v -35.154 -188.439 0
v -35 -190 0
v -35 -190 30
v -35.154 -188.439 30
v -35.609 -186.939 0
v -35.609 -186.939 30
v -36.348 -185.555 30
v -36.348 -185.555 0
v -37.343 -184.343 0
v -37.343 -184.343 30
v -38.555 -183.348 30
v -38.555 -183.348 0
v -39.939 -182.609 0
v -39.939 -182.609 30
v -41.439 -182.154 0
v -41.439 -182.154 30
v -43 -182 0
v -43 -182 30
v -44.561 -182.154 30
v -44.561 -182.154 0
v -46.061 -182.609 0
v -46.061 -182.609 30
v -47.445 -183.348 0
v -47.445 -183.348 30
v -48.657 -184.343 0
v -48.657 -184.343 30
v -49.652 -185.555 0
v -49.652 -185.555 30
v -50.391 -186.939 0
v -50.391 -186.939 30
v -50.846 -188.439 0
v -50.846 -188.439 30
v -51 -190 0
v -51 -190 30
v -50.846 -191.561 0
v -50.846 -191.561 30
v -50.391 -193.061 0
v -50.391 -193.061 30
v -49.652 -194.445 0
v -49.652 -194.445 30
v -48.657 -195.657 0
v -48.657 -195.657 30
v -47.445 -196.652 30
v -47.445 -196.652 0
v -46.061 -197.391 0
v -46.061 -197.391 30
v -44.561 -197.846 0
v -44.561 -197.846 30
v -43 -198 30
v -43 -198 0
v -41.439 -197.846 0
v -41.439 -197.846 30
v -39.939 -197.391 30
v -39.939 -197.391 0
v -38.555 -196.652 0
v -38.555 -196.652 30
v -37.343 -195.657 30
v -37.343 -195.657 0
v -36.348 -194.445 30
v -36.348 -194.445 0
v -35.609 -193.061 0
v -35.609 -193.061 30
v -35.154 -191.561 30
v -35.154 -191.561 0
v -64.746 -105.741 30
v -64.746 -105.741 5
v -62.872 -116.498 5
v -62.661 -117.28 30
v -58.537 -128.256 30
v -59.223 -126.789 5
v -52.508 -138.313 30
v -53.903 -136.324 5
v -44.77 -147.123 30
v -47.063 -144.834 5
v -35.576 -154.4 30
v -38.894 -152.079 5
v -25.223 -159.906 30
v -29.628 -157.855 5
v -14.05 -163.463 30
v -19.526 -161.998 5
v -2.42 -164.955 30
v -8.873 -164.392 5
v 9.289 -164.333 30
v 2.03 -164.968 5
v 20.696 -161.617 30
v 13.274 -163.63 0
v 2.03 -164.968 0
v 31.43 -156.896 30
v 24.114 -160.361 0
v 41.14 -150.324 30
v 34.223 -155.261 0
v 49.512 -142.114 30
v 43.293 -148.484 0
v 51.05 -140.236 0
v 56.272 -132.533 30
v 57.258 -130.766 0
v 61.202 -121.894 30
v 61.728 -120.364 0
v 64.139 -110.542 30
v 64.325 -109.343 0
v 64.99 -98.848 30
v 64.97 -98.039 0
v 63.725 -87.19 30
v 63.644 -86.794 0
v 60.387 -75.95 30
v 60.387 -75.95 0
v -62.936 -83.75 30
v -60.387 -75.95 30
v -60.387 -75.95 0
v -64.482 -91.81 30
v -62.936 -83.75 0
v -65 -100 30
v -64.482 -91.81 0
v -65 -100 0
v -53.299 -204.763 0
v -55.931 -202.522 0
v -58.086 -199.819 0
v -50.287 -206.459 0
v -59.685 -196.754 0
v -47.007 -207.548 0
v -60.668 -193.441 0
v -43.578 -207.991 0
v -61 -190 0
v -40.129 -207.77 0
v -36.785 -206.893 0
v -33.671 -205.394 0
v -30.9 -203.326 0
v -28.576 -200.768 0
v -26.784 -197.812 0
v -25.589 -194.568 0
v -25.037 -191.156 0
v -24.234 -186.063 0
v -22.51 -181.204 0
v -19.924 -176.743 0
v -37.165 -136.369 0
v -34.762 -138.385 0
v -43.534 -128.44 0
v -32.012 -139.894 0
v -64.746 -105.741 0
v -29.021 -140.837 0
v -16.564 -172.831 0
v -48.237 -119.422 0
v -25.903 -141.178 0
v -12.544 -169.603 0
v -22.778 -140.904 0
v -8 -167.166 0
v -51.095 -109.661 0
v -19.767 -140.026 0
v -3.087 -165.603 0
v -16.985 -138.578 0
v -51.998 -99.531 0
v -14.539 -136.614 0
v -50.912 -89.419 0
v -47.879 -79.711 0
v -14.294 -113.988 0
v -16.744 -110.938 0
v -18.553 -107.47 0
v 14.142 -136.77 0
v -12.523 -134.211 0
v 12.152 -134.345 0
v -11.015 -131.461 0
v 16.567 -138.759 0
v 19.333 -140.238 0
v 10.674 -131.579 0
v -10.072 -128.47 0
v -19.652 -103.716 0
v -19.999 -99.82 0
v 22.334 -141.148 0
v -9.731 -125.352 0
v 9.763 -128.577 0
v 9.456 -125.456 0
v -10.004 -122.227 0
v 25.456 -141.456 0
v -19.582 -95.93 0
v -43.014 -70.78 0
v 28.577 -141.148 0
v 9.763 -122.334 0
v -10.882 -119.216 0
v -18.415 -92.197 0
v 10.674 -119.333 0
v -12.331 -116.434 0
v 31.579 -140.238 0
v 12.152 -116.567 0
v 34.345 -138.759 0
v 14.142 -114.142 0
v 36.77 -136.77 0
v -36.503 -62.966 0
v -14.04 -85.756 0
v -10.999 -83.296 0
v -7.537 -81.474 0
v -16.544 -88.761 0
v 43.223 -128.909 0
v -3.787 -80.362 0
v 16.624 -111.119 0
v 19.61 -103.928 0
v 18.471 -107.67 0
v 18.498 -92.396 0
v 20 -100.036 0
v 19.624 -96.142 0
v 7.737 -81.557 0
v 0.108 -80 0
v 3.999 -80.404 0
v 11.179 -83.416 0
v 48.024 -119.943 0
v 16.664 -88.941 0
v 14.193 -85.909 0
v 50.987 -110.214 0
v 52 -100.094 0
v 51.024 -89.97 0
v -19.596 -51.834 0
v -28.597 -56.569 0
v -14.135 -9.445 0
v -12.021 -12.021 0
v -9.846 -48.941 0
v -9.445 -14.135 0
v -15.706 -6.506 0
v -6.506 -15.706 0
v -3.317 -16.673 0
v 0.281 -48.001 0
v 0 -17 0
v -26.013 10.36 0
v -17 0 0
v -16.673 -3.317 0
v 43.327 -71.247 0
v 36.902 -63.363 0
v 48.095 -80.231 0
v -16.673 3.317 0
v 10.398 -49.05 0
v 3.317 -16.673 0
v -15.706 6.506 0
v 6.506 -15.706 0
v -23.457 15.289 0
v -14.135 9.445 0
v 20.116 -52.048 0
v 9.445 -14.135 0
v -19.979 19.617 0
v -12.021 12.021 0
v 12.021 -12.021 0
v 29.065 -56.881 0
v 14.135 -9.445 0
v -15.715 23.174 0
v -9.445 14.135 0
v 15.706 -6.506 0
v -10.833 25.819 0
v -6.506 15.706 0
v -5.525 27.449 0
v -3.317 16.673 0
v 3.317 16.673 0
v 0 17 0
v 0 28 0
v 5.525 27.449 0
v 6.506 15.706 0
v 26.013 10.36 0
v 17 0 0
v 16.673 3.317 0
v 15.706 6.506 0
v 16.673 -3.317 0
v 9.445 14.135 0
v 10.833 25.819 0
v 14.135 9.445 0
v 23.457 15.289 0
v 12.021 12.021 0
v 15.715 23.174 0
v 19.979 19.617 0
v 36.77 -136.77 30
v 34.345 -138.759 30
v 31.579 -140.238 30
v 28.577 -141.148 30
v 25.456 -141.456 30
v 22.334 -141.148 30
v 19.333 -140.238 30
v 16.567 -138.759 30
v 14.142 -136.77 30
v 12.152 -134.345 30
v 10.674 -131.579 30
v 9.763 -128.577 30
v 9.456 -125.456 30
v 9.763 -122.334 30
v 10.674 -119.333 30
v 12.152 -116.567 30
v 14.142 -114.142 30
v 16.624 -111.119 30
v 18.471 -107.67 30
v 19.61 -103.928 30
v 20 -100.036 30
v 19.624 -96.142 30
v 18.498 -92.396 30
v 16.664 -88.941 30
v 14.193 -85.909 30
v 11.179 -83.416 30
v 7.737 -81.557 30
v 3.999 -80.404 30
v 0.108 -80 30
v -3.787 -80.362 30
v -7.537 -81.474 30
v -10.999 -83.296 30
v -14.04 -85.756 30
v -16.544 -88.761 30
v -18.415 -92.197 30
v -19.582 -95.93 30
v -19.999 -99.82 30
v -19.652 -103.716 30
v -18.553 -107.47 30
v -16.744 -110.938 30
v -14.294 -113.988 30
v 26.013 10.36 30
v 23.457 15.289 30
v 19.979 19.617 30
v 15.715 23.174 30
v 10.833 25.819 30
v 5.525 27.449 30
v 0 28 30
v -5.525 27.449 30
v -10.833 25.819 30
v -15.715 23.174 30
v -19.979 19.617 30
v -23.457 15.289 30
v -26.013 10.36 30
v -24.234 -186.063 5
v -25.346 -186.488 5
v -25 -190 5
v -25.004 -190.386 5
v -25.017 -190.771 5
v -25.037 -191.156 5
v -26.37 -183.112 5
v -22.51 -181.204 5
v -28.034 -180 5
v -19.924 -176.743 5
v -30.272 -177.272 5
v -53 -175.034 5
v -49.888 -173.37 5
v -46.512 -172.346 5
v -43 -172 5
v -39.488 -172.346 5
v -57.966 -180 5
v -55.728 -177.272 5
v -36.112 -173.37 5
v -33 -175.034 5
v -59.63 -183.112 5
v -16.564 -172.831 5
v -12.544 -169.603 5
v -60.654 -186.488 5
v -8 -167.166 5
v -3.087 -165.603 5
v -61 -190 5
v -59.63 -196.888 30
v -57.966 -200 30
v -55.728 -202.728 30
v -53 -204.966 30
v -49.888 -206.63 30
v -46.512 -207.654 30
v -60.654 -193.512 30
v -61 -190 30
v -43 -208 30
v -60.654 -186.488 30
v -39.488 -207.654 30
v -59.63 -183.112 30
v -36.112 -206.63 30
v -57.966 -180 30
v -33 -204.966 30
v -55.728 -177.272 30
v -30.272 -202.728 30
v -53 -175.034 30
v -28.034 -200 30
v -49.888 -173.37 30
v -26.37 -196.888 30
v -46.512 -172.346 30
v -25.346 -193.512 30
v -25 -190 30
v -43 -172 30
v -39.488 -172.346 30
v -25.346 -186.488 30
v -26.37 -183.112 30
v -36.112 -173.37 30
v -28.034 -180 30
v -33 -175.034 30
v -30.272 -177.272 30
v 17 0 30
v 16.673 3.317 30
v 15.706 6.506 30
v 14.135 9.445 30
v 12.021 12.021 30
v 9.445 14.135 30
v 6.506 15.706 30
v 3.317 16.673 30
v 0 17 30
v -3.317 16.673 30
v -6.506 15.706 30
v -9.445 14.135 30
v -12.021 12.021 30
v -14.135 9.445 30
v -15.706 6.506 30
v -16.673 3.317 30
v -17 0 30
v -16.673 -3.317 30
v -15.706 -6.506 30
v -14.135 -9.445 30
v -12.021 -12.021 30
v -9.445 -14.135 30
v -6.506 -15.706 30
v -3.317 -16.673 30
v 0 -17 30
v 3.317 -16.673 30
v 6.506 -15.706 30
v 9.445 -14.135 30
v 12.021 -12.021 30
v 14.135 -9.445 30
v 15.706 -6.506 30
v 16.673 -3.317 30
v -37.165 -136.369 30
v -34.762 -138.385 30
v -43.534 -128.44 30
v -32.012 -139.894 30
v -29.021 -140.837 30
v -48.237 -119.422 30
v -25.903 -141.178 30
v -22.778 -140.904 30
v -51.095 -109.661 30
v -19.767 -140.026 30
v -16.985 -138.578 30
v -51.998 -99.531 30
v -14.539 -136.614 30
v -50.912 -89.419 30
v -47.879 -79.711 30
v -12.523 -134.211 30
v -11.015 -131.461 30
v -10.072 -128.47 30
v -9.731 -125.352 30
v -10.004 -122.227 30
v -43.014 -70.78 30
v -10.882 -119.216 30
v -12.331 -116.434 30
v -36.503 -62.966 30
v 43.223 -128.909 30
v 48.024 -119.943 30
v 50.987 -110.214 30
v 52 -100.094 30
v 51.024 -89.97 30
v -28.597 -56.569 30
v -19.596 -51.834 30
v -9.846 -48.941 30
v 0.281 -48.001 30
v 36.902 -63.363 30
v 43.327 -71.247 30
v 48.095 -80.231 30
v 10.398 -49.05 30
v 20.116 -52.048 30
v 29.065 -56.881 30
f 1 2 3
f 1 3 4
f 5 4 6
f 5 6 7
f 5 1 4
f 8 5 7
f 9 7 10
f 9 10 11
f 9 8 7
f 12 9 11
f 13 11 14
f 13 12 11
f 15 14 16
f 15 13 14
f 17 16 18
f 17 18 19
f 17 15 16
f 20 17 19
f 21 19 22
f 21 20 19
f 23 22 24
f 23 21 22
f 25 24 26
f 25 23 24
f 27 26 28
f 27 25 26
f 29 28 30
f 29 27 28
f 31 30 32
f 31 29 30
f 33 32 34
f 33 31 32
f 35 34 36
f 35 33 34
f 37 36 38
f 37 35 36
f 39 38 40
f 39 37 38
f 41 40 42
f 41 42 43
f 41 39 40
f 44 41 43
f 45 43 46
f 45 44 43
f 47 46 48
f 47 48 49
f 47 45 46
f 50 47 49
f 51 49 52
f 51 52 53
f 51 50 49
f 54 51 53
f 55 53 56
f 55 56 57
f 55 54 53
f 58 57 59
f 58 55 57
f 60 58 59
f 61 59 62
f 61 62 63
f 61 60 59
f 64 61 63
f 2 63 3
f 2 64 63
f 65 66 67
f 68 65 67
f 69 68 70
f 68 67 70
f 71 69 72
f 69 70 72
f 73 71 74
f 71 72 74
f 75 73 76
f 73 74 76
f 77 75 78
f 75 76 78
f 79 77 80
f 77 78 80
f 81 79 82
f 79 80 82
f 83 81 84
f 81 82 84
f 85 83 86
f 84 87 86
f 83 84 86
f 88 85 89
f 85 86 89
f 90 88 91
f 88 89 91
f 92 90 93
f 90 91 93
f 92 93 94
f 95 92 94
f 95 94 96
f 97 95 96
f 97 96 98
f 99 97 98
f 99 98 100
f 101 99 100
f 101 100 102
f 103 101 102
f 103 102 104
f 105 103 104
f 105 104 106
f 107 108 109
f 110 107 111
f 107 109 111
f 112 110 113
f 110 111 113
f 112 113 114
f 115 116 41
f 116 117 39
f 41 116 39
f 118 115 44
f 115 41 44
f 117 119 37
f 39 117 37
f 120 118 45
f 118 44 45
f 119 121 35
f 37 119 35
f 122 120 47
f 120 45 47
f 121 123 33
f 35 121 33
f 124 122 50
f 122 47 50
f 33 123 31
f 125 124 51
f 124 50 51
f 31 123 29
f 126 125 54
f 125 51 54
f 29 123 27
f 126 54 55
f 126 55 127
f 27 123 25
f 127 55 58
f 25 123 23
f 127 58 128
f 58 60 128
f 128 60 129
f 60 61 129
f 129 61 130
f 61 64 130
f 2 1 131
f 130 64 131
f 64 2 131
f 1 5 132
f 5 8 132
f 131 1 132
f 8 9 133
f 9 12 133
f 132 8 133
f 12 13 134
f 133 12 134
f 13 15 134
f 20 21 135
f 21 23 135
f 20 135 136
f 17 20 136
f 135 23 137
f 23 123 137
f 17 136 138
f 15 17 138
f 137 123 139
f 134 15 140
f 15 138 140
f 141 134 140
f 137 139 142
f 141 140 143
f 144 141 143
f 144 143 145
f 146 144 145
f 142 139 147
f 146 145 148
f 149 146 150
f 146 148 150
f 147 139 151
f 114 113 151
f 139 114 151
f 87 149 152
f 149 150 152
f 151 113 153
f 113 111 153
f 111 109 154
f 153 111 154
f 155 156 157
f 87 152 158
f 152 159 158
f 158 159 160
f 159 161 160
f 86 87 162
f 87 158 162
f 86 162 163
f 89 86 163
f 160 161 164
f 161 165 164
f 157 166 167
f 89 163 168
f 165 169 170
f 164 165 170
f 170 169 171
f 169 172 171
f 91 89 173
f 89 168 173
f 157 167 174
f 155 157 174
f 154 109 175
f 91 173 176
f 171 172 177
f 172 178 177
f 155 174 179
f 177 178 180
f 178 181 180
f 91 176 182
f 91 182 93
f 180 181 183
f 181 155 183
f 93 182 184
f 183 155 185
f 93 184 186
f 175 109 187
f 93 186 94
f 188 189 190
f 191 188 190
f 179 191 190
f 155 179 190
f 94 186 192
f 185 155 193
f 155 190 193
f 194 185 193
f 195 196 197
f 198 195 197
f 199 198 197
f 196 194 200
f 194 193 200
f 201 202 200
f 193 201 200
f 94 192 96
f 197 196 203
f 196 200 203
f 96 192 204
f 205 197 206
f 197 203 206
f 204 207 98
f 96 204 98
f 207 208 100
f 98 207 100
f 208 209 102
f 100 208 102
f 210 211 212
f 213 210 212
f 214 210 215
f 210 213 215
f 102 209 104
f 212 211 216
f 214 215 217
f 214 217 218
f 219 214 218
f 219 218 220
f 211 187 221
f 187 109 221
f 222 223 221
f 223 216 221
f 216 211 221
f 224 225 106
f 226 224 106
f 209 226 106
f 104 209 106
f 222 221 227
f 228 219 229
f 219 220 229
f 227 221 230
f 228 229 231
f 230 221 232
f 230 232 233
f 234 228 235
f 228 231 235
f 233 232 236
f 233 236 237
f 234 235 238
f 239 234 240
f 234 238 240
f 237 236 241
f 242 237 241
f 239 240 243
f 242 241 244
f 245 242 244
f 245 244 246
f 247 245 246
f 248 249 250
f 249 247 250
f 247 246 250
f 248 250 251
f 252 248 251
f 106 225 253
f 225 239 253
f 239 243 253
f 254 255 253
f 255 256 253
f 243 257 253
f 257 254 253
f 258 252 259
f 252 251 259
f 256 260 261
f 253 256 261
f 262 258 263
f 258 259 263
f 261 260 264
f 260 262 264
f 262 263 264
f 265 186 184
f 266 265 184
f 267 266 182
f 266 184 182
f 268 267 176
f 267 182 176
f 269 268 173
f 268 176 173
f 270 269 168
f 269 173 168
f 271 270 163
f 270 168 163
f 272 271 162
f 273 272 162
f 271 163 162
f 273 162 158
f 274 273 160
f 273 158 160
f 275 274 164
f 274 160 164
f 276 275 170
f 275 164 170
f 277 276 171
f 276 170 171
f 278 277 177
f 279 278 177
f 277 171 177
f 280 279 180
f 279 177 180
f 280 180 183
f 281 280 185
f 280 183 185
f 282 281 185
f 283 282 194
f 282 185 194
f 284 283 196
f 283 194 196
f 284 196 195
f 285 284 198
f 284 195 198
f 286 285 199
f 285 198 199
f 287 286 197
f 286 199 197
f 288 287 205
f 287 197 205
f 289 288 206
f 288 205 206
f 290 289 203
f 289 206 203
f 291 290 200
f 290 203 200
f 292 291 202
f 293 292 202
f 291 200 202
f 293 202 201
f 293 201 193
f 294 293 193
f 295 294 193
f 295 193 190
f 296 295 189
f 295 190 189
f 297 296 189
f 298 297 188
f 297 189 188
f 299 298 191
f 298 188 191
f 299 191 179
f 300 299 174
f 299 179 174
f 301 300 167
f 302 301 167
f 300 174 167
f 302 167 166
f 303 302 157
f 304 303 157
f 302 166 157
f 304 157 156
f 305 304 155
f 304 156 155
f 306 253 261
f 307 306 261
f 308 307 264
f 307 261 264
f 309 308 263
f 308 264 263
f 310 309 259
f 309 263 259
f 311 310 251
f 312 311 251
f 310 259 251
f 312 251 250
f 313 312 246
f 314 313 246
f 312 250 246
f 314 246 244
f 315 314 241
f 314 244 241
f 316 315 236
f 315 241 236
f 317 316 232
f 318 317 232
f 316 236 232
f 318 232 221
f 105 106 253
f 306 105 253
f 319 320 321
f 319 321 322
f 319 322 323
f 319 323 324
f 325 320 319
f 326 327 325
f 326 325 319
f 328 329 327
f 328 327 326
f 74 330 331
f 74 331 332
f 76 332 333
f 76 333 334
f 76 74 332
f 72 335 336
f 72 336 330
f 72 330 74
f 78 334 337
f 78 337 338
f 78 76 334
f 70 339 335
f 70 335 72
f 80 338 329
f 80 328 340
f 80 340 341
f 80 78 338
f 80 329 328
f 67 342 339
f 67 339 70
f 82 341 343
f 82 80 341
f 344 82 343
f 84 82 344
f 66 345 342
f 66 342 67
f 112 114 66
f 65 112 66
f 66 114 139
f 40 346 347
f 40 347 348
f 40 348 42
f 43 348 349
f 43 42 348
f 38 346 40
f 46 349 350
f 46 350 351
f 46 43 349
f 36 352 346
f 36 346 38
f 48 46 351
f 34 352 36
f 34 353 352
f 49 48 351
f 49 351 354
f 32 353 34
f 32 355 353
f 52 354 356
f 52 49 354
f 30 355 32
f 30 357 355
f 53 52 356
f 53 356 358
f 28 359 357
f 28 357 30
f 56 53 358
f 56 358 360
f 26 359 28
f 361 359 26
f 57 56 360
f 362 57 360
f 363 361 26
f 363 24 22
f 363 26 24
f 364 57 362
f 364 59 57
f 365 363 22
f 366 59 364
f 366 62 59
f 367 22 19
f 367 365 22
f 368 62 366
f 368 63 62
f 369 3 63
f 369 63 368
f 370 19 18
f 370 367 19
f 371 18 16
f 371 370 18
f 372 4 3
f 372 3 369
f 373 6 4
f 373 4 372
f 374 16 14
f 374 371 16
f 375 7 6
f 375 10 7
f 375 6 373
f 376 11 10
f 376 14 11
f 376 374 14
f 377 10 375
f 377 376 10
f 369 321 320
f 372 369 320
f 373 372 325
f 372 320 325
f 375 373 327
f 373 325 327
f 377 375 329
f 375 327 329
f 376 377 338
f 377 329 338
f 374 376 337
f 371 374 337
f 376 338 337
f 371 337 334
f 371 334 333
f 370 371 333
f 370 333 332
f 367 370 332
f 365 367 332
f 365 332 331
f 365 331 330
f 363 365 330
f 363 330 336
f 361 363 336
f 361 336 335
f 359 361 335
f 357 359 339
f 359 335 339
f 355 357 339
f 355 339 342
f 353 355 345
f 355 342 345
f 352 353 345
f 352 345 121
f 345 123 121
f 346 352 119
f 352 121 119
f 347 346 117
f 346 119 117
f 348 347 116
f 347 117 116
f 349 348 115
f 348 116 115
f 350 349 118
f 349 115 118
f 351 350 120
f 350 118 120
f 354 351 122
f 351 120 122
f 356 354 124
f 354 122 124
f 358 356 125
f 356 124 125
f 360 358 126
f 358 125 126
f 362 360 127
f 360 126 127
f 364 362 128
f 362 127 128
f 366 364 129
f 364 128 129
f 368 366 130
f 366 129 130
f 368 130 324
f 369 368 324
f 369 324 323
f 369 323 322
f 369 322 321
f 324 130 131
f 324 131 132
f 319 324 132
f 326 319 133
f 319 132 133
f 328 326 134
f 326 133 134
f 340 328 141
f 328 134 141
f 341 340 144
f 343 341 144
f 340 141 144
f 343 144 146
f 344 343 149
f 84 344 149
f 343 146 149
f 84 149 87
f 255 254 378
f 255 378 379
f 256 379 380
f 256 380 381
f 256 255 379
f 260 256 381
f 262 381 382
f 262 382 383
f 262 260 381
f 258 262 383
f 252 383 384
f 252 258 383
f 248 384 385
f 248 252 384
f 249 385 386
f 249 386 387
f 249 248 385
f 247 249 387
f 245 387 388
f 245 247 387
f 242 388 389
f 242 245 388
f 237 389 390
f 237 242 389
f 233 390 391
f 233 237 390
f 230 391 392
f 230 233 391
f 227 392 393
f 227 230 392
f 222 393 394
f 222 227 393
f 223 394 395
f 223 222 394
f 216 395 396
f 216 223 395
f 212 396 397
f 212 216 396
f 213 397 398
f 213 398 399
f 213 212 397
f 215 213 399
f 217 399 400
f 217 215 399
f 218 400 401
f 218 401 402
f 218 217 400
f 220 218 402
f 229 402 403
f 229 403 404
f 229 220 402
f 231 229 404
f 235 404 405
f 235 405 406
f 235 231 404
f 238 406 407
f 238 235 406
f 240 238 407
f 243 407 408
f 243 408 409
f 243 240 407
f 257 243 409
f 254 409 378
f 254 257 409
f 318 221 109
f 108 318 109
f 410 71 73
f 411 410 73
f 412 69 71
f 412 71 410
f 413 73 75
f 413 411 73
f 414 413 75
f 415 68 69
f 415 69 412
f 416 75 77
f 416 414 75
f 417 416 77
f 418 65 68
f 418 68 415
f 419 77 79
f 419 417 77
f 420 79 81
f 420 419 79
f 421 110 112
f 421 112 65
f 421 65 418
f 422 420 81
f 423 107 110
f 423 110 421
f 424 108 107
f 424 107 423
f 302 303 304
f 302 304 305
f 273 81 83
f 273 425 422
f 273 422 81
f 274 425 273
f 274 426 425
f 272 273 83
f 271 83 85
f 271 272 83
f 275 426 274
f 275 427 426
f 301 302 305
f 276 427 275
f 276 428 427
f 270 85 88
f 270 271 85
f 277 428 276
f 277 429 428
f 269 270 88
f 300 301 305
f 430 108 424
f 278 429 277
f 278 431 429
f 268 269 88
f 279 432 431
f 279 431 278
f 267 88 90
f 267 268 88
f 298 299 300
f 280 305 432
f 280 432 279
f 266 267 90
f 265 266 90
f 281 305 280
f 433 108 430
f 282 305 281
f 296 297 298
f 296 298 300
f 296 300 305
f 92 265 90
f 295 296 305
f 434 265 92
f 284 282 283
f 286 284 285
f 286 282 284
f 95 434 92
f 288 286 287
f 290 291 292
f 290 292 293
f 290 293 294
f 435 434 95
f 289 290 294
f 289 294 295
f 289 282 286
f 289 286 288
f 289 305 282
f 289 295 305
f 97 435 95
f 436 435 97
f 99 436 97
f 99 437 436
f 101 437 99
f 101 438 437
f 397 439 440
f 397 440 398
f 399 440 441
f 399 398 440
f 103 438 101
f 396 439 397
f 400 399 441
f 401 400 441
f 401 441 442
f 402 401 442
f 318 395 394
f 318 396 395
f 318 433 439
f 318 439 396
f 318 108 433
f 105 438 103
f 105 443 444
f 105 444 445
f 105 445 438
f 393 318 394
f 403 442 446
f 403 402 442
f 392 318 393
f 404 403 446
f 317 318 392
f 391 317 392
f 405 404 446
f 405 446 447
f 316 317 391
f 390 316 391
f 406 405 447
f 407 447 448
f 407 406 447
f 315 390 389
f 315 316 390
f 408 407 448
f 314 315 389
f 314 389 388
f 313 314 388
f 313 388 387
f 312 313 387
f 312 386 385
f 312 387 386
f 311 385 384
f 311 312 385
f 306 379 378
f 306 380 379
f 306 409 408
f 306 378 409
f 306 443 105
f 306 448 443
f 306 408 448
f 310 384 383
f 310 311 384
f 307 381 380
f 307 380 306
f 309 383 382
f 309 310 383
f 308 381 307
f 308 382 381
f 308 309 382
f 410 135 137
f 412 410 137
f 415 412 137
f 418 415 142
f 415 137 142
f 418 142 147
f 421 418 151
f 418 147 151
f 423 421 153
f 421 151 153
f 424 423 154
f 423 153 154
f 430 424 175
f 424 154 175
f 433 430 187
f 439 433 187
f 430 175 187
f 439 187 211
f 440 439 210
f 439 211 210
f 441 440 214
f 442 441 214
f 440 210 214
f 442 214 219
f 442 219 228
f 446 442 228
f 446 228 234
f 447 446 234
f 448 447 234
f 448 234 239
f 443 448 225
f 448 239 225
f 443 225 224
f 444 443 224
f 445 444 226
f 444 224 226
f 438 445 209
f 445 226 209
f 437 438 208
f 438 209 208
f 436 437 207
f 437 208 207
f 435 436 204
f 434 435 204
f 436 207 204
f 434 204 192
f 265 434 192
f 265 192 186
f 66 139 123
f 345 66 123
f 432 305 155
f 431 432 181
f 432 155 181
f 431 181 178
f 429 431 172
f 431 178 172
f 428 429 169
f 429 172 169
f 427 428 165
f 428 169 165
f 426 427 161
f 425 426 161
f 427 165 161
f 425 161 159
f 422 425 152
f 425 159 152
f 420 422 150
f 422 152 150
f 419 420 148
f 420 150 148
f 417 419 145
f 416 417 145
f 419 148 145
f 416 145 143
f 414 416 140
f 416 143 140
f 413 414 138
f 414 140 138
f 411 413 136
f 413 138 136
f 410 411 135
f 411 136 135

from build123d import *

# Parameters (mm, degrees)
SKETCH2_R           = 17
BOSS_EXTRUDE1_DEPTH = 30
SKETCH2_4_R         = 18
SKETCH2_4_R_2       = 8
BOSS_EXTRUDE2_DEPTH = 30
BOSS_EXTRUDE3_DEPTH = 5


with BuildPart() as part:
    # Sketch2 → Boss-Extrude1 (new body)
    with BuildSketch(Plane.XY):
        with BuildLine():
            Line((60.387064012, -75.95), (26.012889113, 10.36))
            ThreePointArc((26.012889113, 10.36), (0, 28), (-26.012889113, 10.36))
            Line((-26.012889113, 10.36), (-60.387064012, -75.95))
            ThreePointArc((-60.387064012, -75.95), (-63.836349993, -87.755800573), (-65, -100))
            Line((-65, -100), (-64.745963704, -105.741096069))
            ThreePointArc((-64.745963704, -105.741096069), (-43.885241002, -147.948781238), (0, -165))
            ThreePointArc((0, -165), (53.797072411, -136.481159521), (60.387064012, -75.95))
        make_face()
        with BuildLine():
            ThreePointArc((-37.165332046, -136.369466506), (0.28138508, -48.000761328), (36.769552622, -136.769552622))
            ThreePointArc((36.769552622, -136.769552622), (14.142135624, -136.769552622), (14.142135624, -114.142135624))
            ThreePointArc((14.142135624, -114.142135624), (0.108225031, -80.000292819), (-14.294358479, -113.988256349))
            ThreePointArc((-14.294358479, -113.988256349), (-14.539240183, -136.614348211), (-37.165332046, -136.369466506))
        make_face(mode=Mode.SUBTRACT)
        Circle(SKETCH2_R, mode=Mode.SUBTRACT)
    extrude(amount=BOSS_EXTRUDE1_DEPTH)



with BuildPart() as body_2:
    # Sketch2<4> → Boss-Extrude2 (new body)
    with BuildSketch(Plane.XY):
        with Locations((-43, -190)):
            Circle(SKETCH2_4_R)
        with Locations((-43, -190)):
            Circle(SKETCH2_4_R_2, mode=Mode.SUBTRACT)
    extrude(amount=BOSS_EXTRUDE2_DEPTH)


with BuildPart() as part_1:
    add(part.part)

    add(body_2.part)  # Boss-Extrude3 merges body 2
    # Sketch3 → Boss-Extrude3 (add)
    with BuildSketch(Plane.XY):
        with BuildLine():
            ThreePointArc((2.030385563, -164.968280987), (-43.130914594, -148.62843002), (-64.745963704, -105.741096069))
            Line((-64.745963704, -105.741096069), (-61, -190))
            ThreePointArc((-61, -190), (-43, -172), (-25, -190))
            ThreePointArc((-25, -190), (-25.009294588, -190.578375974), (-25.037168752, -191.15615464))
            ThreePointArc((-25.037168752, -191.15615464), (-16.564278272, -172.831330157), (2.030385563, -164.968280987))
        make_face()
    extrude(amount=BOSS_EXTRUDE3_DEPTH)


solid = part_1.part
